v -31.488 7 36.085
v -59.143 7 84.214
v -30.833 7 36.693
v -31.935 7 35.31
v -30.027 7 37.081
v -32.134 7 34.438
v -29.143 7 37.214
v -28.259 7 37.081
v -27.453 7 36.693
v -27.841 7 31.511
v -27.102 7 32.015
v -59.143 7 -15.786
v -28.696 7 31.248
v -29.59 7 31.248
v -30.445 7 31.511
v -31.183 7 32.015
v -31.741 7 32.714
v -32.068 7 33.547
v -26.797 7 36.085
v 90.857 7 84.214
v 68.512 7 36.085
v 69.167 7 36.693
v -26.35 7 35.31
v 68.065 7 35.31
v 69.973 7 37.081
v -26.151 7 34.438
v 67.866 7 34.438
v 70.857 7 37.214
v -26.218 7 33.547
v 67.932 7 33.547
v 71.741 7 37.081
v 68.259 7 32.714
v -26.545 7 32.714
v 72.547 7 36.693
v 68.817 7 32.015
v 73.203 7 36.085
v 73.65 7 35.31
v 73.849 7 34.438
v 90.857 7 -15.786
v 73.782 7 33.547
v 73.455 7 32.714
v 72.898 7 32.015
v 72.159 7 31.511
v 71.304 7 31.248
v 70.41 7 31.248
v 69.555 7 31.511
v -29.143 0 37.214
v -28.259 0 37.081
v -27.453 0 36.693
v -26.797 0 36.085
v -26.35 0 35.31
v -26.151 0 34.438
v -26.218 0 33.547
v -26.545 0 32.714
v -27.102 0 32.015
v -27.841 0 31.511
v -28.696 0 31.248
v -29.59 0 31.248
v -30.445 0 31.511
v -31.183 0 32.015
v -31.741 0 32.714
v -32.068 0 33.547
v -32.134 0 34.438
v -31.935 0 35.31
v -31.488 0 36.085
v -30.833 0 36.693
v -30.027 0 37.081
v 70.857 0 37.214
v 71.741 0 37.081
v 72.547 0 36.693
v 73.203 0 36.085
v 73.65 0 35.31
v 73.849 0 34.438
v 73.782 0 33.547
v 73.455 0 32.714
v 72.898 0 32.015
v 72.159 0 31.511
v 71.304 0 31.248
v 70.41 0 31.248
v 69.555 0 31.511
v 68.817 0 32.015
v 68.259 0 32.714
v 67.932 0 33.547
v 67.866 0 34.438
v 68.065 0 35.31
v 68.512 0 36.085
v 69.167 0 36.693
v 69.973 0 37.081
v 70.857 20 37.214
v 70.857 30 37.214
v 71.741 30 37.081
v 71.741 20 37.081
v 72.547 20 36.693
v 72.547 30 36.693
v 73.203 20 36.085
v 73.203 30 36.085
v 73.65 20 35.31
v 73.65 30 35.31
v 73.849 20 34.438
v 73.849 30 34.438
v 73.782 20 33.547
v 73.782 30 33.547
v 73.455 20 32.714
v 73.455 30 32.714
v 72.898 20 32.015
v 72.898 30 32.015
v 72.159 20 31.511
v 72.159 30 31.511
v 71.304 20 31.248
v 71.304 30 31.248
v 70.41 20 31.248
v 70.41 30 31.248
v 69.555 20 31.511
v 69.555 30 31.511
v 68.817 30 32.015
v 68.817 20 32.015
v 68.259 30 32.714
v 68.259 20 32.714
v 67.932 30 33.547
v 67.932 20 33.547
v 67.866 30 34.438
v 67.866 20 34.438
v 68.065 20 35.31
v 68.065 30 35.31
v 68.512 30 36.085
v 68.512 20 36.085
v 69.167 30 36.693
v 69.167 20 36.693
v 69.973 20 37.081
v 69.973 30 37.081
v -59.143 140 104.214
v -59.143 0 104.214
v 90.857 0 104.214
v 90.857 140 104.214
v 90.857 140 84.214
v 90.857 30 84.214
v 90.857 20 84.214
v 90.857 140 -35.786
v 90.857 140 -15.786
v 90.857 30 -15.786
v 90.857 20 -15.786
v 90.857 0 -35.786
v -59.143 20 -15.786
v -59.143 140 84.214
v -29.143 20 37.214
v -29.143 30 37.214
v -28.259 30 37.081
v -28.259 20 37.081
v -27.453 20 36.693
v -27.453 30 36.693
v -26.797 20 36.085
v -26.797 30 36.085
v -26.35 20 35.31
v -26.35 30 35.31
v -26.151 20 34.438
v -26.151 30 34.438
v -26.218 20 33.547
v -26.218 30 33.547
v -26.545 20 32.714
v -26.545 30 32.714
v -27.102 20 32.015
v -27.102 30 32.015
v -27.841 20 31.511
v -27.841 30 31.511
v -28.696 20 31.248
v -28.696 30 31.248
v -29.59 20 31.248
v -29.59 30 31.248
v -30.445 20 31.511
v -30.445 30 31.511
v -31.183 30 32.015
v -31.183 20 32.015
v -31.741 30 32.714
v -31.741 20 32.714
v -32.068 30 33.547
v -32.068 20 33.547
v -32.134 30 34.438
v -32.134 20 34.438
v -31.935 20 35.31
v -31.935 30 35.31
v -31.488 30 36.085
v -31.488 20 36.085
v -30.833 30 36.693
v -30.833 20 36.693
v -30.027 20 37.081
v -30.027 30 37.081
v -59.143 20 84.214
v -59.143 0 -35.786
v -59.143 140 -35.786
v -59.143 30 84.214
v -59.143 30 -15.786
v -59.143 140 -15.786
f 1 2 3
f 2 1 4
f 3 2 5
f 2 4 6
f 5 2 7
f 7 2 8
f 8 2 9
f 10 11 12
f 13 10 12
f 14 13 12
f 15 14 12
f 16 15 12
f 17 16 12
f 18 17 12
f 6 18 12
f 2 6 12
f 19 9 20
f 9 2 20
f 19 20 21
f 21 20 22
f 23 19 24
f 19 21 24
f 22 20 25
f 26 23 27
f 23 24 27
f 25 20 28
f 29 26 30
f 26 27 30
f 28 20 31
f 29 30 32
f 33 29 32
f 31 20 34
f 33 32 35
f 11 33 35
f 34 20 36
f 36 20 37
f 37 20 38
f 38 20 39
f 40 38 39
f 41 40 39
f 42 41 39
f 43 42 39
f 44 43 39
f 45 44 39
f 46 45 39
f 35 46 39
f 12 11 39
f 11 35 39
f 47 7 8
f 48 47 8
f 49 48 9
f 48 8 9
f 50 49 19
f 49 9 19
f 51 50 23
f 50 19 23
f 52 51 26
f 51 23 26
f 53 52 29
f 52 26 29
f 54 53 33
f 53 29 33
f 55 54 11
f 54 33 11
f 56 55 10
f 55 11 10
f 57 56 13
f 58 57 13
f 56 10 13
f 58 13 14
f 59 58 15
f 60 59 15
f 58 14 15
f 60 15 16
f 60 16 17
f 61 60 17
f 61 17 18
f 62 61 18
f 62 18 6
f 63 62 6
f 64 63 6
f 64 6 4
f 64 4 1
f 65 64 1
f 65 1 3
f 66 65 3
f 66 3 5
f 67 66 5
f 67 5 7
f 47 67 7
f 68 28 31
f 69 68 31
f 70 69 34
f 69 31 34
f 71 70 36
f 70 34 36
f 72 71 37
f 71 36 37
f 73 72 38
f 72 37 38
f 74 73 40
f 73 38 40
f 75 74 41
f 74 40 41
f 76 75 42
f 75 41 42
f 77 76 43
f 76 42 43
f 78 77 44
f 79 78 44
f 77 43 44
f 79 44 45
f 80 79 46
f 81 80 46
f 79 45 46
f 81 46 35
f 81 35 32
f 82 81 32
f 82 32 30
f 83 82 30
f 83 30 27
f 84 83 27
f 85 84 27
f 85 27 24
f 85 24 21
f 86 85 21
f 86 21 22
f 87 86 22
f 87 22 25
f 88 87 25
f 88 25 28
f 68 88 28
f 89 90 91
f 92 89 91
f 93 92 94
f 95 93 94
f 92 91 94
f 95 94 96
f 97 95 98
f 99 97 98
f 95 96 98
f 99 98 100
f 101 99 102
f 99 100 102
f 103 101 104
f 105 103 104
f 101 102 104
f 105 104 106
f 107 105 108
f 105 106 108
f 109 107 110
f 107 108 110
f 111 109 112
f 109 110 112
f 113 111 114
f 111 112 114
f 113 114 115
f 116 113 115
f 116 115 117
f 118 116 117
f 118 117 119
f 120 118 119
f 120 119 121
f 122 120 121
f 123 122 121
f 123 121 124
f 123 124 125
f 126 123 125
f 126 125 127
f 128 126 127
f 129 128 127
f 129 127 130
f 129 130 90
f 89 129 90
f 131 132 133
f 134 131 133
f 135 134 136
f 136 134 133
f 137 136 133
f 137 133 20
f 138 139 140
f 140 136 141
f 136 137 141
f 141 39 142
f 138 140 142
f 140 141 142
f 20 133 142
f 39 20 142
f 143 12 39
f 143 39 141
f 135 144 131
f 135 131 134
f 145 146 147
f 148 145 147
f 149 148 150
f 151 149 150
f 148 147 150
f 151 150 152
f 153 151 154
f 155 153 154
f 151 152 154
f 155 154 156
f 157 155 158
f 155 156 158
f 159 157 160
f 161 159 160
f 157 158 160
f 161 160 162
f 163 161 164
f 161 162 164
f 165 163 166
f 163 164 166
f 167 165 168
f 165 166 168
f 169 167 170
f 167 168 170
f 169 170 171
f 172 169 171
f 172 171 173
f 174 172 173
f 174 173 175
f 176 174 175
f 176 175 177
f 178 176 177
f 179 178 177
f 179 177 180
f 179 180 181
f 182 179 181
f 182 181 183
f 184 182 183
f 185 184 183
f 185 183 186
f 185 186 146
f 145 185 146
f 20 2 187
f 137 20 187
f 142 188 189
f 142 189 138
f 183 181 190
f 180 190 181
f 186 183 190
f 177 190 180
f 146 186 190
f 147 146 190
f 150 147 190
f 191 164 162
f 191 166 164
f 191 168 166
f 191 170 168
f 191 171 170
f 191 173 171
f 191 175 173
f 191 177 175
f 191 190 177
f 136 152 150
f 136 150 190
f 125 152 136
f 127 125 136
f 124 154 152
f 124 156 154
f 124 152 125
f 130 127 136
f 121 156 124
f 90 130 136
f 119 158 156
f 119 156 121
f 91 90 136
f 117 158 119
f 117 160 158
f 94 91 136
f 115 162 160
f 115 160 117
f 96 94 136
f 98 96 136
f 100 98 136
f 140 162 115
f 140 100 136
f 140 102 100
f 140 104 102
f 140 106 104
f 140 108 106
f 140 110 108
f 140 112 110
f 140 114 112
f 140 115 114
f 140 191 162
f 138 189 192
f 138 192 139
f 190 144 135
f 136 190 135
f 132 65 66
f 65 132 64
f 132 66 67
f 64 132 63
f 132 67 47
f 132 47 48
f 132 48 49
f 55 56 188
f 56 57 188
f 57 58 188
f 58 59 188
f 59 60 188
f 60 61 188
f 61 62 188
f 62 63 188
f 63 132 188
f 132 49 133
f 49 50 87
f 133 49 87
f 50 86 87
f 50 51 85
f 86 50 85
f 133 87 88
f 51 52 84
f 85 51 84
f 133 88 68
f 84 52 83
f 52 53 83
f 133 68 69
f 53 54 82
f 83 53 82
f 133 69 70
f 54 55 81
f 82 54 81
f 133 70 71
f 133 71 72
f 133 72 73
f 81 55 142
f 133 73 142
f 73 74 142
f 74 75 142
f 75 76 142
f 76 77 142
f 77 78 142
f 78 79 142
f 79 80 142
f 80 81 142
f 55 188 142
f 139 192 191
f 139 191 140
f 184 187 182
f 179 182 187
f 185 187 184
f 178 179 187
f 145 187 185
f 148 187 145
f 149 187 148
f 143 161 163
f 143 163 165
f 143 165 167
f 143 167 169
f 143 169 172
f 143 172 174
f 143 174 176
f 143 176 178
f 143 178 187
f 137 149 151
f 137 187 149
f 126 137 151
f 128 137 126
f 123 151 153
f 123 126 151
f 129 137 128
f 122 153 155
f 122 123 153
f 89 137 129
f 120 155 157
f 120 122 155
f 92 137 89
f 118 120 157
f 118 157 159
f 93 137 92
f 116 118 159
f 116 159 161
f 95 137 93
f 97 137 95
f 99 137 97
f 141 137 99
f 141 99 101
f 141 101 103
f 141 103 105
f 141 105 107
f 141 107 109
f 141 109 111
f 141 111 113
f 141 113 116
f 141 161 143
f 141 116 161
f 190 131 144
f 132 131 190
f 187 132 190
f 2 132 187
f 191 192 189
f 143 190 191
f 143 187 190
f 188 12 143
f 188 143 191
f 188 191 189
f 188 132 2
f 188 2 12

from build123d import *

# Parameters (mm, degrees)
SKETCH_2_W          = 150
SKETCH_2_H          = 140
EXTRUDE_1_DEPTH     = 140
SKETCH_3_W          = 150
SKETCH_3_H          = 100
CUT_EXTRUDE_1_DEPTH = 110
SKETCH_4_W          = 100
SKETCH_4_H          = 13
CUT_EXTRUDE_2_DEPTH = 231.131739112
SKETCH_5_R          = 3
CUT_EXTRUDE_3_DEPTH = 50
SKETCH_6_R          = 3
CUT_EXTRUDE_4_DEPTH = 177.679477459


with BuildPart() as part:
    # 草圖2 → 填料-伸長1 (new body)
    with BuildSketch(Plane(origin=(0, 0, 0), x_dir=(1, 0, 0), z_dir=(0, 1, 0))):
        with Locations((15.857142857, -34.214285714)):
            Rectangle(SKETCH_2_W, SKETCH_2_H)
    extrude(amount=EXTRUDE_1_DEPTH)

    # 草圖3 → 除料-伸長1 (cut)
    with BuildSketch(Plane(origin=(0, 140, 0), x_dir=(1, 0, 0), z_dir=(0, 1, 0))):
        with Locations((15.857142857, -34.214285714)):
            Rectangle(SKETCH_3_W, SKETCH_3_H)
    extrude(amount=-CUT_EXTRUDE_1_DEPTH, mode=Mode.SUBTRACT)

    # 草圖4 → 除料-伸長2 (cut, through all)
    with BuildSketch(Plane(origin=(90.857142857, 0, 0), x_dir=(0, 0, -1), z_dir=(1, 0, 0))):
        with Locations((-34.214285714, 13.5)):
            Rectangle(SKETCH_4_W, SKETCH_4_H)
    extrude(amount=-CUT_EXTRUDE_2_DEPTH, mode=Mode.SUBTRACT)

    # 草圖5 → 除料-伸長3 (cut)
    with BuildSketch(Plane(origin=(0, 30, 0), x_dir=(1, 0, 0), z_dir=(0, 1, 0))):
        with Locations(Location((70.857142857, -34.214285714, 0), (0, 0, 270))):
            Circle(SKETCH_5_R)
    extrude(amount=-CUT_EXTRUDE_3_DEPTH, mode=Mode.SUBTRACT)

    # 草圖6 → 除料-伸長4 (cut, through all)
    with BuildSketch(Plane(origin=(0, 30, 0), x_dir=(1, 0, 0), z_dir=(0, 1, 0))):
        with Locations(Location((-29.142857143, -34.214285714, 0), (0, 0, 270))):
            Circle(SKETCH_6_R)
    extrude(amount=-CUT_EXTRUDE_4_DEPTH, mode=Mode.SUBTRACT)


solid = part.part
